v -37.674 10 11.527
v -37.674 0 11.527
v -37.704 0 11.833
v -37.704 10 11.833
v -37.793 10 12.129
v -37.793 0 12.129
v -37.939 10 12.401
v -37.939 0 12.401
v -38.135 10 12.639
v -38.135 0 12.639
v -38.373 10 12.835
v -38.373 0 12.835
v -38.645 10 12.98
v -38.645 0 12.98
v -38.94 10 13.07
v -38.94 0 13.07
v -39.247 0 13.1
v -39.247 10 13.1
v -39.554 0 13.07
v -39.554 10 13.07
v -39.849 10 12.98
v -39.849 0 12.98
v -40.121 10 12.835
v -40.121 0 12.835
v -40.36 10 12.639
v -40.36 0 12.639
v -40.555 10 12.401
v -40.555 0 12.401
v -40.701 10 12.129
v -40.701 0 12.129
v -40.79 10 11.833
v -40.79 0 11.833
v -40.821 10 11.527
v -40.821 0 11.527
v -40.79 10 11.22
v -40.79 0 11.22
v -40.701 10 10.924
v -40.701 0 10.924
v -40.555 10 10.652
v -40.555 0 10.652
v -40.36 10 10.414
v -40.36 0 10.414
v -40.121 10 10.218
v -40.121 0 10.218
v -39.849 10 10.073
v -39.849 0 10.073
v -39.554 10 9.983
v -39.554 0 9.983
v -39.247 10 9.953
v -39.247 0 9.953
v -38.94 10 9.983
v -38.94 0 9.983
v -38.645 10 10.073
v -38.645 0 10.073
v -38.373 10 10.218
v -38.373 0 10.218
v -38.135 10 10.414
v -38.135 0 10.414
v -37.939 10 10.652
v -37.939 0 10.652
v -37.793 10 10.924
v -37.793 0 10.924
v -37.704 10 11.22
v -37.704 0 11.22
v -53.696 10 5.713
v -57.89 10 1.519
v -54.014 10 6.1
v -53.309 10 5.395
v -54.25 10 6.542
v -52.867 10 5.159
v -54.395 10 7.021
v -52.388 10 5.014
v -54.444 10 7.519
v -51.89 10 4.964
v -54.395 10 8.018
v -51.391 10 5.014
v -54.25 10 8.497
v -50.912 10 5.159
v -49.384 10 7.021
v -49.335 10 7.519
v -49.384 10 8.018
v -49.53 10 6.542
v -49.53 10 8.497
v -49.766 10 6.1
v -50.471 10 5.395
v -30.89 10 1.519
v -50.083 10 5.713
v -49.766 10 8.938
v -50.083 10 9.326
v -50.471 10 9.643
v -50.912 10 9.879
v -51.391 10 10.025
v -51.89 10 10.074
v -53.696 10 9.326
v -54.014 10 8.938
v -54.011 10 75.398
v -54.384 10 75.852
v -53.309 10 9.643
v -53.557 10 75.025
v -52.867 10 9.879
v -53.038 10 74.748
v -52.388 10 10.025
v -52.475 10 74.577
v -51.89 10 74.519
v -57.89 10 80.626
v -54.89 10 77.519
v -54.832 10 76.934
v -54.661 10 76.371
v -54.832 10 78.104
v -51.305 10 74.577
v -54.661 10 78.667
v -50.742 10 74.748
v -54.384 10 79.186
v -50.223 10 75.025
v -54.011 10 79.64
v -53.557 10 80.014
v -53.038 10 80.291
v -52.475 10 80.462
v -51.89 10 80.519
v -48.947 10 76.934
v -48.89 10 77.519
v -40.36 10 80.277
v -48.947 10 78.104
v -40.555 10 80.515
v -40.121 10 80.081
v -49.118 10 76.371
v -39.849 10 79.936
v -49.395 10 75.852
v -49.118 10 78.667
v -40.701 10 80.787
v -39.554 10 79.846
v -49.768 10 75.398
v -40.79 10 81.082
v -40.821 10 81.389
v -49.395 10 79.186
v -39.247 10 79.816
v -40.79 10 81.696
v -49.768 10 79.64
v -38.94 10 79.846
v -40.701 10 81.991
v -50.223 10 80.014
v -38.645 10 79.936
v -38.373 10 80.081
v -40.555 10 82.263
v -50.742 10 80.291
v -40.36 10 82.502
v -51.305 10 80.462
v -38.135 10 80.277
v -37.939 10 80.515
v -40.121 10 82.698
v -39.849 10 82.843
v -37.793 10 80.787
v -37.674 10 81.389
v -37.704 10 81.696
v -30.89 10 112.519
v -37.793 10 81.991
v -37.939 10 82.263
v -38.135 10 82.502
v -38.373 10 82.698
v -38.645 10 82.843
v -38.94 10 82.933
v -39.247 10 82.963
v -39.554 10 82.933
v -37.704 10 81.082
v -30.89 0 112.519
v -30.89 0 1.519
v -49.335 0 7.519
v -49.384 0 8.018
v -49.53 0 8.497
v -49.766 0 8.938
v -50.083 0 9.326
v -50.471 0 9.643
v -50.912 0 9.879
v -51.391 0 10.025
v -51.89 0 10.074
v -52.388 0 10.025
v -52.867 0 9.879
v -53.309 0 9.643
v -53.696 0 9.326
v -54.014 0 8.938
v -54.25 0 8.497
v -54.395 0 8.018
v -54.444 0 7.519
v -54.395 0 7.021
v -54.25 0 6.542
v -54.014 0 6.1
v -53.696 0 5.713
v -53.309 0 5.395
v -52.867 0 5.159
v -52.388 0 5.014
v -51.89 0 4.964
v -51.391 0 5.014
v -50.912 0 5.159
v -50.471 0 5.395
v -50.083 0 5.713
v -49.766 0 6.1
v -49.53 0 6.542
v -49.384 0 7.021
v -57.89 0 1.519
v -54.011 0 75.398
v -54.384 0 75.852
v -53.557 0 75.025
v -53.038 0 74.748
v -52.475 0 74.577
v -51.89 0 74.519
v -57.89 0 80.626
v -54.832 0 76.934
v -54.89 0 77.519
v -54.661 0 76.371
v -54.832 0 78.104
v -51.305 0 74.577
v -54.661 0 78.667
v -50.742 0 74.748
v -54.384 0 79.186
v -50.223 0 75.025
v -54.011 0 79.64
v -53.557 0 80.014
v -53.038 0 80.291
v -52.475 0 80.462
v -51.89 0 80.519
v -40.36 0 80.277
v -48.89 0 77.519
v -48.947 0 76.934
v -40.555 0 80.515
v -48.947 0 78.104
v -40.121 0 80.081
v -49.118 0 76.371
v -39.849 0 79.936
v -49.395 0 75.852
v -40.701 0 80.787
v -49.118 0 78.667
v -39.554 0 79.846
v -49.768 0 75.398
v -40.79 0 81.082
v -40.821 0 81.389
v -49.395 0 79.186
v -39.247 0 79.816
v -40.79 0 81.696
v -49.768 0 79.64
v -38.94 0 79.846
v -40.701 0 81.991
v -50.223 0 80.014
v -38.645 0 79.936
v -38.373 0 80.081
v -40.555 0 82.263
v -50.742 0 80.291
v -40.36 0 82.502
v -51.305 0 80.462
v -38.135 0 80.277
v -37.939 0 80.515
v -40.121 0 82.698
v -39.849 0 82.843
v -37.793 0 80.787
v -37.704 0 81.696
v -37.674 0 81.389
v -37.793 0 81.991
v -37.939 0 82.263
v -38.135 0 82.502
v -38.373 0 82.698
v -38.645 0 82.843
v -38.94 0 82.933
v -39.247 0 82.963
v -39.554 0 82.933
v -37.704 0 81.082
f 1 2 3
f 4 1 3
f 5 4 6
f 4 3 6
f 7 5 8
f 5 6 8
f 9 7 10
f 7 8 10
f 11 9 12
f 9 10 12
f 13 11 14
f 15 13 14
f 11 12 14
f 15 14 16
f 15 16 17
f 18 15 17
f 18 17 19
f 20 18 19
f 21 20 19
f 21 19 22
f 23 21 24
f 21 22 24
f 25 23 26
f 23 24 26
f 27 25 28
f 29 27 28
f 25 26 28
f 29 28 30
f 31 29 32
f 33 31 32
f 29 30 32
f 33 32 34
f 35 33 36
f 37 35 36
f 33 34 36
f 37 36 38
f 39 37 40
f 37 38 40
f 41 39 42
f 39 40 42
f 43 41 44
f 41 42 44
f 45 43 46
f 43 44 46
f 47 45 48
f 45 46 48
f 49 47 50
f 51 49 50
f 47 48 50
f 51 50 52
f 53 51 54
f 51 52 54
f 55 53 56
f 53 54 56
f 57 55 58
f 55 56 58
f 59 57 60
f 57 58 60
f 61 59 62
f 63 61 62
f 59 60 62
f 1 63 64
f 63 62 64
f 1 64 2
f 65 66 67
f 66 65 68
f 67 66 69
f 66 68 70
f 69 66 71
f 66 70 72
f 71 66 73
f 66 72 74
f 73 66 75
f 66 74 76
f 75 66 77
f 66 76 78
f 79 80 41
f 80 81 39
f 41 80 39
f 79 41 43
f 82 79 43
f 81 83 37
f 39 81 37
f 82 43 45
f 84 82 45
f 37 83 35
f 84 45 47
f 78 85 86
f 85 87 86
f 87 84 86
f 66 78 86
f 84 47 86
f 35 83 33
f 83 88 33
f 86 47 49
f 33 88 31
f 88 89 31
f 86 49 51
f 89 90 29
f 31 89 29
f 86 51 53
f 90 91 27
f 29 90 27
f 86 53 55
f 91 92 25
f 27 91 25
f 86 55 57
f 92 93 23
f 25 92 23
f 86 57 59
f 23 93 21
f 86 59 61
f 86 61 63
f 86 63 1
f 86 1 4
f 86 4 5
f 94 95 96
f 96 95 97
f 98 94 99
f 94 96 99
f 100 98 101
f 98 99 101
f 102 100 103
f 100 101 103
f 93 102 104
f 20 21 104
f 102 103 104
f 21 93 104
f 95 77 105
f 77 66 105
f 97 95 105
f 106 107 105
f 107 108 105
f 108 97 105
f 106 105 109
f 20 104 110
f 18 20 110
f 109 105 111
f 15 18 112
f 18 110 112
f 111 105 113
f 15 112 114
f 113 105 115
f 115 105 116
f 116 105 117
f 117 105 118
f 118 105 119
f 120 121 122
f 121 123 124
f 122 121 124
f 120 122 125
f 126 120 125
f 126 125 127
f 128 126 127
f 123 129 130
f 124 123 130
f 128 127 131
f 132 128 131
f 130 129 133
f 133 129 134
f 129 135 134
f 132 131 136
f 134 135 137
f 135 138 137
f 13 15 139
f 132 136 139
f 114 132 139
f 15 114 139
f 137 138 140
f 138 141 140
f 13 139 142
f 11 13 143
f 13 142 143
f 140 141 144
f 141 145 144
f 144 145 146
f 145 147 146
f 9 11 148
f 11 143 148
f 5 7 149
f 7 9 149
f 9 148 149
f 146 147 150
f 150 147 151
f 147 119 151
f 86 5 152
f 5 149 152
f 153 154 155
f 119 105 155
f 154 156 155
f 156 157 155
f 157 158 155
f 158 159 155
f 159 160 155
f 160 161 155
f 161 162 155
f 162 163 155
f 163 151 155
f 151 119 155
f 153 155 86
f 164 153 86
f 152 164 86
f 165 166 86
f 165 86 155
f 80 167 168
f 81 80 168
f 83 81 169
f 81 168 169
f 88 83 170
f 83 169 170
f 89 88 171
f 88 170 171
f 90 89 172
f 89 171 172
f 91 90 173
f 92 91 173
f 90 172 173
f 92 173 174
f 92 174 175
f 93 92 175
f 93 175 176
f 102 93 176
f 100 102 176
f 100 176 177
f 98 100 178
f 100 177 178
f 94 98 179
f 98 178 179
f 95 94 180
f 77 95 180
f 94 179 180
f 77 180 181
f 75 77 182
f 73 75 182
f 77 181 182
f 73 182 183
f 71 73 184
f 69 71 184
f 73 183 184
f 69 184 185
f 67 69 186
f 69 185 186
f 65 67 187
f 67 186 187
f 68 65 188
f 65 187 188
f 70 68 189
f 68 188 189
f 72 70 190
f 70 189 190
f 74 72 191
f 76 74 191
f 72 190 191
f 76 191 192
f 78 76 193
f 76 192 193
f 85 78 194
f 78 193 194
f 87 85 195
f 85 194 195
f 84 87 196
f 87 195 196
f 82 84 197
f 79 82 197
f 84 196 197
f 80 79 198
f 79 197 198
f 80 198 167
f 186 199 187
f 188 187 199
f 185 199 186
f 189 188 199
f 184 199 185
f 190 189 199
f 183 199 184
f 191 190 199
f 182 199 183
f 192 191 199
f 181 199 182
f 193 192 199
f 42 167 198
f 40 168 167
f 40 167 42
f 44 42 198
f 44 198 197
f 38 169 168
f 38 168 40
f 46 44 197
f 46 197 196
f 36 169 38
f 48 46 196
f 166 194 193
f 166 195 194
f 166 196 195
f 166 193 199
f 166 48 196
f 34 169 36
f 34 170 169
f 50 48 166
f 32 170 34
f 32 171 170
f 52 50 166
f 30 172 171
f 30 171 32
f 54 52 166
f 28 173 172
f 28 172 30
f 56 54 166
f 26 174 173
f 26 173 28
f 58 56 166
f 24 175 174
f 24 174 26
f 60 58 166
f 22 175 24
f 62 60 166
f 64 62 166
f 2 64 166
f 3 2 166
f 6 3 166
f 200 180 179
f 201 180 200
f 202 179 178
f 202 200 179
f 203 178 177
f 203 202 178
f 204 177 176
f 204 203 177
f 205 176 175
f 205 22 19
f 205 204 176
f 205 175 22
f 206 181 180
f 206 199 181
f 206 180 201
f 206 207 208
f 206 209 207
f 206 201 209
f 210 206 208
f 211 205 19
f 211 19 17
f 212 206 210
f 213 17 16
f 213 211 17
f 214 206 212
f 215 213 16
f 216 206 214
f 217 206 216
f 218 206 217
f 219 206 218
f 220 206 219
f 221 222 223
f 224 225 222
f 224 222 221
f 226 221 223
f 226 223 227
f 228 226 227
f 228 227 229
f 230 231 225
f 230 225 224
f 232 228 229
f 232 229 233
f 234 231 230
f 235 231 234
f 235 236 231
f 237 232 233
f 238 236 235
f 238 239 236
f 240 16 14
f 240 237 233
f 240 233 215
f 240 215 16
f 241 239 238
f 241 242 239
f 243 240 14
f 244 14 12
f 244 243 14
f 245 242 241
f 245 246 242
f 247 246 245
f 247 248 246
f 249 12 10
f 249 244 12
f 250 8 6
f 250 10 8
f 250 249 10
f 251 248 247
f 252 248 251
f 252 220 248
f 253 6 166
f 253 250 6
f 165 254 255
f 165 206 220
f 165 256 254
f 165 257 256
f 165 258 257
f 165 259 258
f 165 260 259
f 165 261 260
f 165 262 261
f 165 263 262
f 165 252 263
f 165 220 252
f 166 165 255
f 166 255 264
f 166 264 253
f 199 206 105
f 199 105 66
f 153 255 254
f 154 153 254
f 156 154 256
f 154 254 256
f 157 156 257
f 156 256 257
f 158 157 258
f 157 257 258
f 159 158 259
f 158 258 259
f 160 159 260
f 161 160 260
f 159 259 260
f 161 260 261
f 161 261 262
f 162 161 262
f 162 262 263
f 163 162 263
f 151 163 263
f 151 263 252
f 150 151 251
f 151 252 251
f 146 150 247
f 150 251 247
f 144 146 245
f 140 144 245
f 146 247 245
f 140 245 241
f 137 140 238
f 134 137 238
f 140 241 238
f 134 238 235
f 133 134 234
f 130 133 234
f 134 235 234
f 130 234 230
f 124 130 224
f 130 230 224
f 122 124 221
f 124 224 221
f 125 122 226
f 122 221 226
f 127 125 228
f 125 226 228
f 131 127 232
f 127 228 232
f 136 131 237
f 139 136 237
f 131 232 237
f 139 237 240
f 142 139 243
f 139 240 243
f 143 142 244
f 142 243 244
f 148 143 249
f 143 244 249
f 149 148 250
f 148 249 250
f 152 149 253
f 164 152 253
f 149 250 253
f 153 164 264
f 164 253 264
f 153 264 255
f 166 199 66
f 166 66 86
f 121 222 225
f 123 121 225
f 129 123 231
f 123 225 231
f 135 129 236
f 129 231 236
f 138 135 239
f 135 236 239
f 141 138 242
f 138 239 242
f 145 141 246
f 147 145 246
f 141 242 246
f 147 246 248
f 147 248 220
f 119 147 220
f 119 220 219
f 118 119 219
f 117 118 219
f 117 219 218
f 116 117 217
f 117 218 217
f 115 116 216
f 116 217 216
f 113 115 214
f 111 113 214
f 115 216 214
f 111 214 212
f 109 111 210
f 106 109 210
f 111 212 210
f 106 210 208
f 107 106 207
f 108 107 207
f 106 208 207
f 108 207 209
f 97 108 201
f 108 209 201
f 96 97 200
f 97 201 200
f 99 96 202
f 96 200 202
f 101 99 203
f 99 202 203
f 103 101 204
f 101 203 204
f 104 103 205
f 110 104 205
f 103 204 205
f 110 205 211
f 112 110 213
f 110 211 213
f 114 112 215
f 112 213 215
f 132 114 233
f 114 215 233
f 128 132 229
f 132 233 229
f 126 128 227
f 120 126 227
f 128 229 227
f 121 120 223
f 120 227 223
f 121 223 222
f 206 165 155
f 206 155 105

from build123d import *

# Parameters (mm, degrees)
F0_R     = 2.554654
F0_R_2   = 1.573486
F0_R_3   = 3
F1_DEPTH = 10


with BuildPart() as f1:
    # F0 (on Front) → F1 (new body)
    with BuildSketch(Plane.XZ):
        Polygon((-57.889797, 80.625616), (-57.889797, 1.519148), (-30.889797, 1.519148), (-30.889797, 112.519148), align=None)
        with Locations((-51.889797, 7.519148)):
            Circle(F0_R, mode=Mode.SUBTRACT)
        with Locations((-39.247134, 11.526519)):
            Circle(F0_R_2, mode=Mode.SUBTRACT)
        with Locations((-51.889797, 77.519148)):
            Circle(F0_R_3, mode=Mode.SUBTRACT)
        with Locations((-39.247134, 81.3893)):
            Circle(F0_R_2, mode=Mode.SUBTRACT)
    extrude(amount=-F1_DEPTH)


solid = f1.part
